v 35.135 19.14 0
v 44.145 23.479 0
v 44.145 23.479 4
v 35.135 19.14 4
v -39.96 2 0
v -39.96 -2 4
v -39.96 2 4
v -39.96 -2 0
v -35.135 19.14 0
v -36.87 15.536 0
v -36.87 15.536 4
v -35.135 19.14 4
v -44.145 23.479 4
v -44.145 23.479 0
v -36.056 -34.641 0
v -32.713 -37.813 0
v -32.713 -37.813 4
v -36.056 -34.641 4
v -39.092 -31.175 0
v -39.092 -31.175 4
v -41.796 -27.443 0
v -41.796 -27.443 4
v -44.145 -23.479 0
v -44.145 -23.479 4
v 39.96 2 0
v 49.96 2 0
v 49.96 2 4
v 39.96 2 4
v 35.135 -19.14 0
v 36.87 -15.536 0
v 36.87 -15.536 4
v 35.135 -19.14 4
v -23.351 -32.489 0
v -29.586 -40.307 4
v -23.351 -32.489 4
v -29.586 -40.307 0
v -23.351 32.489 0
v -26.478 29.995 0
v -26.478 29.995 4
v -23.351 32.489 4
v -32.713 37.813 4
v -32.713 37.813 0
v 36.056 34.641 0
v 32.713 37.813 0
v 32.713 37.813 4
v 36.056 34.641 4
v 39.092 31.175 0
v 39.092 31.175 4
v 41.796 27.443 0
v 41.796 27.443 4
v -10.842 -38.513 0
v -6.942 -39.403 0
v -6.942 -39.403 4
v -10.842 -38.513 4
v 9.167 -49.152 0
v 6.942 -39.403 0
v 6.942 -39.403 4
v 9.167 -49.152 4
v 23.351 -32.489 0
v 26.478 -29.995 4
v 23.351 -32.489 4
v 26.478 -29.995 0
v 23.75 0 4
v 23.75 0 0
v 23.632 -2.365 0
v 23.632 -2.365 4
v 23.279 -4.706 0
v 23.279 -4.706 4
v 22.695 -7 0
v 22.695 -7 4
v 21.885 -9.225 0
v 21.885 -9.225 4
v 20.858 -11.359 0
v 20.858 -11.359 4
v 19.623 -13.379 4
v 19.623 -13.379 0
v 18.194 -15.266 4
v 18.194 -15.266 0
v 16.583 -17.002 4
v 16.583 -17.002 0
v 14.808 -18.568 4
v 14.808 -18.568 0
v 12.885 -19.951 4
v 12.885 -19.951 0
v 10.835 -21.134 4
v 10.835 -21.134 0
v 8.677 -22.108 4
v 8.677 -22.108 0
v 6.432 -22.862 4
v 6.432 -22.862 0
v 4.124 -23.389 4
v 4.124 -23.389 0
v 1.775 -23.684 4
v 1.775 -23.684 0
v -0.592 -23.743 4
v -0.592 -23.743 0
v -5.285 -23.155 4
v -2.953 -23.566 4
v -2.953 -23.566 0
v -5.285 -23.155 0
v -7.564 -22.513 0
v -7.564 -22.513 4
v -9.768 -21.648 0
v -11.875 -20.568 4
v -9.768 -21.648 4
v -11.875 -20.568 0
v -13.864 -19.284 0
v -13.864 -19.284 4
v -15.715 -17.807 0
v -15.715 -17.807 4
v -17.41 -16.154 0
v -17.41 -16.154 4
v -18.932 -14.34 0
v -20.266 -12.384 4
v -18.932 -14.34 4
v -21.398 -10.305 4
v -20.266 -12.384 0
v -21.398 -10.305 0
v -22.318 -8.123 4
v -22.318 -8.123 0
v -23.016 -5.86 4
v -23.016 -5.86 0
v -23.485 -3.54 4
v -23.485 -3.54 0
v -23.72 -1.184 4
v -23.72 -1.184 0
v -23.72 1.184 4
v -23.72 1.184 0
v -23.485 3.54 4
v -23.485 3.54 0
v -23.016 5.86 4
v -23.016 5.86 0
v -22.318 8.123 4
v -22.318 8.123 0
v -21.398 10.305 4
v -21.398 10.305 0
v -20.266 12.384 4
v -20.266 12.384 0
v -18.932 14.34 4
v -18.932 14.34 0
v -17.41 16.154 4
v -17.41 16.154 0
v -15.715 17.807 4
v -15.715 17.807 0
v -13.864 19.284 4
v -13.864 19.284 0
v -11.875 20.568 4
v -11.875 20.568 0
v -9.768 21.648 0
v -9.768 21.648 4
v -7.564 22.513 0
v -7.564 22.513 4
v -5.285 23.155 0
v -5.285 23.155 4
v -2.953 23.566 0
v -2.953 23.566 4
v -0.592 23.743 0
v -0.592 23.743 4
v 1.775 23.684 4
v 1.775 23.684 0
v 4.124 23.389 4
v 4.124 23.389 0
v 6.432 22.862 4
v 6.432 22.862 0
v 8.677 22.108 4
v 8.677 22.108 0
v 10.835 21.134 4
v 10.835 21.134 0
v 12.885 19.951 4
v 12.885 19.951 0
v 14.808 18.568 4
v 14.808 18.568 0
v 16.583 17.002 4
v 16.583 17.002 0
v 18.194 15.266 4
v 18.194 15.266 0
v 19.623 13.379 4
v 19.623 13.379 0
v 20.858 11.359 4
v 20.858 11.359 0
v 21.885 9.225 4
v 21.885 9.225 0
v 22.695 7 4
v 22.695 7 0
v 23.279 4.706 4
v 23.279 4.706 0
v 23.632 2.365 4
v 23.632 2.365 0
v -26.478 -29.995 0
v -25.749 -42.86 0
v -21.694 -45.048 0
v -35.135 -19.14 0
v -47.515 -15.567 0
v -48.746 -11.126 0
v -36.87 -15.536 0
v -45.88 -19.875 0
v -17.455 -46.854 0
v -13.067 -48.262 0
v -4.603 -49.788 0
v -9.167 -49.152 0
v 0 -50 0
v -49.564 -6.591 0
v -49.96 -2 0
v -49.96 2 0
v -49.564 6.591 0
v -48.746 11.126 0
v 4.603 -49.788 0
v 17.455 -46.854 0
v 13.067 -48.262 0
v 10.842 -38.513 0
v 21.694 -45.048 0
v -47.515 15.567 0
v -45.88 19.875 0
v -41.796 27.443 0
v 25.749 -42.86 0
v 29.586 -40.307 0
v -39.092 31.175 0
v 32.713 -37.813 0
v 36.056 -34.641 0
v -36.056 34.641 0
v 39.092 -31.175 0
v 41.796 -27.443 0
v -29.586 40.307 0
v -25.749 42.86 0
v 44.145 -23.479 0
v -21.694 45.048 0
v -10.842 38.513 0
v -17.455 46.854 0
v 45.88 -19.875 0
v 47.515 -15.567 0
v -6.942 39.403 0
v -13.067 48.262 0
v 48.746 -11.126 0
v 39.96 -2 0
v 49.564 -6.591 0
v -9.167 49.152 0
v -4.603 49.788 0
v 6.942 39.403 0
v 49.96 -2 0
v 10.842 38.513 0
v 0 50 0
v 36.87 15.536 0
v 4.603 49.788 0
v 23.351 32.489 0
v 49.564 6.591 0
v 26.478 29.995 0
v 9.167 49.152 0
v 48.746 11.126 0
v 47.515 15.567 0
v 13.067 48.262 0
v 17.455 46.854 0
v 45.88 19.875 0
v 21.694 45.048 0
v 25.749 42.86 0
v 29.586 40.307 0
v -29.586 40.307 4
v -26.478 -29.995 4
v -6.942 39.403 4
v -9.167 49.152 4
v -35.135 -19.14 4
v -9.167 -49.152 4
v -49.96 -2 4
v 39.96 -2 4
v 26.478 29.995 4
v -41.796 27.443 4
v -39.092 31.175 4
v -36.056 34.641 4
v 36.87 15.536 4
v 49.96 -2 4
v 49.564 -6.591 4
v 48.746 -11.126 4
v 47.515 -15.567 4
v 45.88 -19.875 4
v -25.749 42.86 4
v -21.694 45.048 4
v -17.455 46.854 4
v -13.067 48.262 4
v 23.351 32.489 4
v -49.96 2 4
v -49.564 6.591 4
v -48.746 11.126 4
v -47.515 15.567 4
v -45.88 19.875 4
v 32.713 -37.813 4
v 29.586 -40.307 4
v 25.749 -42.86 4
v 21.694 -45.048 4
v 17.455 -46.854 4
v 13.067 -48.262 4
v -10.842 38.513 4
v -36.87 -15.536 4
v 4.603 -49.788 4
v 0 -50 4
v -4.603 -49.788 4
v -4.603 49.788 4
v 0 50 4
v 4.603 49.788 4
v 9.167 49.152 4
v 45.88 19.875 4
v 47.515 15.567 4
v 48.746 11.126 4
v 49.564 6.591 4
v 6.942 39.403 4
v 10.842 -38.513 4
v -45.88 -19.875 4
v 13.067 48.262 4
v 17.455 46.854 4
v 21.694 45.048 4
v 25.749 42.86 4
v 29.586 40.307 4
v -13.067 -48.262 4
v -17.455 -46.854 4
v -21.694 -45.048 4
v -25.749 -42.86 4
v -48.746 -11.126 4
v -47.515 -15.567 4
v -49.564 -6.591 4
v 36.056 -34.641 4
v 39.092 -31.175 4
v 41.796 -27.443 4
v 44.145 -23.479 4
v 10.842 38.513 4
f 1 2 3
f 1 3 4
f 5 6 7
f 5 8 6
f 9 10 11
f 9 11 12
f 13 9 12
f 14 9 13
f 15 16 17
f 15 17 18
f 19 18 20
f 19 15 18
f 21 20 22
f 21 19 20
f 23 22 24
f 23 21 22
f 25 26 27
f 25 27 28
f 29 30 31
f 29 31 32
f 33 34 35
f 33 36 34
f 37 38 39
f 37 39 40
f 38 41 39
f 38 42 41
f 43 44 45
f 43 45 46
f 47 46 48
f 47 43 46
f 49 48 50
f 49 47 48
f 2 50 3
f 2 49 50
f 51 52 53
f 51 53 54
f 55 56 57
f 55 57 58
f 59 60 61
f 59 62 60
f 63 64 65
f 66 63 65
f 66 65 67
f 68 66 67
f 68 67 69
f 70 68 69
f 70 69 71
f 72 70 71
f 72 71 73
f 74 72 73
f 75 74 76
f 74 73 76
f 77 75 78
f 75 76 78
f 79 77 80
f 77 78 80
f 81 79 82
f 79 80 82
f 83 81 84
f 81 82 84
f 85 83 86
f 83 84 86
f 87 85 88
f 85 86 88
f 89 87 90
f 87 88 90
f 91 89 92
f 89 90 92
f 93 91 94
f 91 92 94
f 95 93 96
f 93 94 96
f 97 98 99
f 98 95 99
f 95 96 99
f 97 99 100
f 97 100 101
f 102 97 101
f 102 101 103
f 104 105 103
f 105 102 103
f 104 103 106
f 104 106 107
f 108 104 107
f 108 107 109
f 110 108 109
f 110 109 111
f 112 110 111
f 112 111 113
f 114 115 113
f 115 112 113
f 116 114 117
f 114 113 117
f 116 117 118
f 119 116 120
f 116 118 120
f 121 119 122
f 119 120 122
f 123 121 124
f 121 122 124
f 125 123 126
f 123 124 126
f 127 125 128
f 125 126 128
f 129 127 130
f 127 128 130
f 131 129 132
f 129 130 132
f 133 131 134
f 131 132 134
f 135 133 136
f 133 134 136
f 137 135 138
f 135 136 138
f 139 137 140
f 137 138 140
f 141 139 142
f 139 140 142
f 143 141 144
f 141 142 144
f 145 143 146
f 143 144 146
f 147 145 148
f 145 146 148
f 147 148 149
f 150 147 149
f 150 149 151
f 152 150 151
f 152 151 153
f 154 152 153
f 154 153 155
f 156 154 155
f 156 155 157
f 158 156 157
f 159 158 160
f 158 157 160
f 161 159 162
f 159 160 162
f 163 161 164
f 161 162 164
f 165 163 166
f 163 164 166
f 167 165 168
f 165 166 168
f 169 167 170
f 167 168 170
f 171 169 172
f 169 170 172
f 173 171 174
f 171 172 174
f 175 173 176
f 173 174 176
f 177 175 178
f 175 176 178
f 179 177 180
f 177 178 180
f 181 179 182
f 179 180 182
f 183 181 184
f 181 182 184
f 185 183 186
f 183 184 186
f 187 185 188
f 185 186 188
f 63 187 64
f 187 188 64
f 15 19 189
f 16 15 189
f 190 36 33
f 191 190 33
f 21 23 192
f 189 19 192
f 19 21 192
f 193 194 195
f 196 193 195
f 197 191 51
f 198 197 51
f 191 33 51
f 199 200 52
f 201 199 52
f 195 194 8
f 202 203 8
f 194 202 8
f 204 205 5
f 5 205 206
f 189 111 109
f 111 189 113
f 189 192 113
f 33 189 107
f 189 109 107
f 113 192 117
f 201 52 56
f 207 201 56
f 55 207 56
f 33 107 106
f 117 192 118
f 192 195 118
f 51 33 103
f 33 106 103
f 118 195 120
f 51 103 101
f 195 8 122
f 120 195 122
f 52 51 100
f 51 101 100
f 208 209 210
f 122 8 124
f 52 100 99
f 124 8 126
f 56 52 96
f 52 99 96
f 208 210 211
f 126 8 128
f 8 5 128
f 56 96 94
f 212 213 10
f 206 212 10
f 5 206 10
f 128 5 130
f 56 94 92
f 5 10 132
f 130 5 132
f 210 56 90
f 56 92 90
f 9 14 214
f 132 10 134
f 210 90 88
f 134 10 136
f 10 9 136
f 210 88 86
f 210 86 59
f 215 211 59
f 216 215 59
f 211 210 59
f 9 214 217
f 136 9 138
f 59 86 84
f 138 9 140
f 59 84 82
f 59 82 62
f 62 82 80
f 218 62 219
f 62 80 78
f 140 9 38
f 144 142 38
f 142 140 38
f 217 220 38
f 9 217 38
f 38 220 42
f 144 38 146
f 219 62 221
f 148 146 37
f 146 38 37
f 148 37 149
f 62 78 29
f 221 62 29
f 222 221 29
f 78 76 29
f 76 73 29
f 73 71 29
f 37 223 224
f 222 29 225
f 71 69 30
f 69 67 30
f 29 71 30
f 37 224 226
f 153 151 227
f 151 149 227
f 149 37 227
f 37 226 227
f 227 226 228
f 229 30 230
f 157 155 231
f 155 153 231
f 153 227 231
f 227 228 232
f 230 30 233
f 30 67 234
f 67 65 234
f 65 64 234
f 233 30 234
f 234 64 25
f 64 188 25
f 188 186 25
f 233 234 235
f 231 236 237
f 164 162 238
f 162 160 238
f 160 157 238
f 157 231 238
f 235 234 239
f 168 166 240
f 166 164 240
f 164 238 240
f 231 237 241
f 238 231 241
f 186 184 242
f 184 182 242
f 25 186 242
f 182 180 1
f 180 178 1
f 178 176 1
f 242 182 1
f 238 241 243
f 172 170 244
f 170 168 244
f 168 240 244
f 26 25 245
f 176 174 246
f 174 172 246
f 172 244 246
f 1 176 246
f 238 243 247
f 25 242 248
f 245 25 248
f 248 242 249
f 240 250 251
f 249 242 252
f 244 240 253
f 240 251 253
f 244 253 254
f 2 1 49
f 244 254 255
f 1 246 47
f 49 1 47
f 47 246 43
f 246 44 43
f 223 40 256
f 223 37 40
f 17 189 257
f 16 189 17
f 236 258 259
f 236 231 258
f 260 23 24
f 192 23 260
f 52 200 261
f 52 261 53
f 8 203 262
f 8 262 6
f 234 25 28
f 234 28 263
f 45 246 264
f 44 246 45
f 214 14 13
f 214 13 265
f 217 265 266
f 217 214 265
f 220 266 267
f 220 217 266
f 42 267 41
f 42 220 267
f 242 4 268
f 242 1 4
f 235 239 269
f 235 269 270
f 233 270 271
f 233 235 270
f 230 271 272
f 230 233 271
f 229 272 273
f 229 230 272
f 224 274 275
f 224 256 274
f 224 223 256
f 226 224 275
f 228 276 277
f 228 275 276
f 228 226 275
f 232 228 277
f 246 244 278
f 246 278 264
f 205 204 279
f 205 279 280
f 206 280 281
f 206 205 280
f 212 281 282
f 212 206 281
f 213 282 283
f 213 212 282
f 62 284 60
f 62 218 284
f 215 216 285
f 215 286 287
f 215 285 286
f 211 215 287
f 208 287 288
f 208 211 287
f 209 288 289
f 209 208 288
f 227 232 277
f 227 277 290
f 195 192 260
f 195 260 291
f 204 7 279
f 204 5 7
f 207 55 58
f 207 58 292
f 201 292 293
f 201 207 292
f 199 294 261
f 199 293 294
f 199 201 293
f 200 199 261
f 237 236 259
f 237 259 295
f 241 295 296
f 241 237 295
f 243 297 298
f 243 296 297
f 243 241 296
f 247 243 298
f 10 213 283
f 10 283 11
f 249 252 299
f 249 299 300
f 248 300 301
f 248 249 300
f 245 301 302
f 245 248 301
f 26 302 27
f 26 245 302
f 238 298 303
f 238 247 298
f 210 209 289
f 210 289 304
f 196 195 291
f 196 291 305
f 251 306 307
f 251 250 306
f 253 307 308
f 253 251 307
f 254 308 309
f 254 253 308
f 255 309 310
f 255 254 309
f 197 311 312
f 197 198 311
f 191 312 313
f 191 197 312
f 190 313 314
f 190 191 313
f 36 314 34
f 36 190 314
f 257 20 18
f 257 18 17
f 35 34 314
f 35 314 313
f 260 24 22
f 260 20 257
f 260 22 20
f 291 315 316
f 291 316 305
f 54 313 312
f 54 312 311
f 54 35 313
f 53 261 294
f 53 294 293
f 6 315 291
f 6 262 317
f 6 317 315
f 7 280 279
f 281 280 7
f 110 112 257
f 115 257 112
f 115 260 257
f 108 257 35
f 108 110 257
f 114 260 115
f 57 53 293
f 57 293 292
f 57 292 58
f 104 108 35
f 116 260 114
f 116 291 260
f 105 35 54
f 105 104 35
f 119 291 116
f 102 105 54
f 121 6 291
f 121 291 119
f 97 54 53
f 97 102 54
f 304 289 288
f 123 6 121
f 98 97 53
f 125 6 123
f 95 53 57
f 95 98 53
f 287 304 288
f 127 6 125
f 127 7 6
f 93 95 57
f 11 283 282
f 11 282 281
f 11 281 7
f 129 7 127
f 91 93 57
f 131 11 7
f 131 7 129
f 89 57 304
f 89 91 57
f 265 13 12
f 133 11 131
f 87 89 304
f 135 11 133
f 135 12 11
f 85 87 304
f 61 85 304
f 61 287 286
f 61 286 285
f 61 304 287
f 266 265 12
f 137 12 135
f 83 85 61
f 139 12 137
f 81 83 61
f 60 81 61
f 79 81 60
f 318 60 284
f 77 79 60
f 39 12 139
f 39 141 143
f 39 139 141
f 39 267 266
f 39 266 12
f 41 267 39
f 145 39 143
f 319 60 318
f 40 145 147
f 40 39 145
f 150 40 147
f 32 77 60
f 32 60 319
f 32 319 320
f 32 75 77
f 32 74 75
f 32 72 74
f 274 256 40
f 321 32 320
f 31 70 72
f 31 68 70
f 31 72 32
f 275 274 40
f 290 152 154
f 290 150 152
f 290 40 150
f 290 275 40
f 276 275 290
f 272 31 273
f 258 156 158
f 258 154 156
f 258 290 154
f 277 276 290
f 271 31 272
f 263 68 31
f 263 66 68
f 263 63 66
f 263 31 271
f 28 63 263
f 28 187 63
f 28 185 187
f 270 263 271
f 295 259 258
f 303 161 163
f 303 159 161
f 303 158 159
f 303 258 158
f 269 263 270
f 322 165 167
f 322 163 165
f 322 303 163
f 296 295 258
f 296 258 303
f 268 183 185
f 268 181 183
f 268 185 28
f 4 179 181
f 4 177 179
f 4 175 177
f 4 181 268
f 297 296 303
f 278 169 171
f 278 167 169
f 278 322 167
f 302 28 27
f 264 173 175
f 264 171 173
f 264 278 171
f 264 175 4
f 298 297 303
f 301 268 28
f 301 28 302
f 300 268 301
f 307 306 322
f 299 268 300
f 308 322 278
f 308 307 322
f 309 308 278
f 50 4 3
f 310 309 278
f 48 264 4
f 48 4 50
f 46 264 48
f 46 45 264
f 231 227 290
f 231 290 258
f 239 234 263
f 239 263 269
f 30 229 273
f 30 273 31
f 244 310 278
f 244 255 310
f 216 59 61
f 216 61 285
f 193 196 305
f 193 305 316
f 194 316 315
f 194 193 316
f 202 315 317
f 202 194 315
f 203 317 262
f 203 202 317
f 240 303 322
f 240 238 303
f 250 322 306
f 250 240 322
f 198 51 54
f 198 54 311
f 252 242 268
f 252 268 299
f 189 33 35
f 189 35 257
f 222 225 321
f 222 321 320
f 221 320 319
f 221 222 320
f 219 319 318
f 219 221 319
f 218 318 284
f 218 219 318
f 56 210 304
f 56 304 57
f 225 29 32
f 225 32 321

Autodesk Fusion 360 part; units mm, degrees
sketch "Sketch1" plane through (0, 0, 0) normal (0, 0, 1) x (1, 0, 0)
  circle A0 centre (0, 0) radius 23.75
  line L0 (49.96, 2) -> (39.96, 2)
  line L1 (39.96, 2) -> (39.96, -2)
  line L2 (39.96, -2) -> (49.96, -2)
  line L3 (44.1446, 23.4788) -> (35.1349, 19.1399)
  line L4 (36.8705, 15.536) -> (45.8802, 19.8749)
  line L5 (35.1349, 19.1399) -> (36.8705, 15.536)
  line L6 (29.5859, 40.3073) -> (23.351, 32.489)
  line L7 (26.4783, 29.995) -> (32.7132, 37.8133)
  line L8 (23.351, 32.489) -> (26.4783, 29.995)
  line L9 (9.1673, 49.1524) -> (6.9421, 39.4031)
  line L10 (10.8418, 38.5131) -> (13.067, 48.2623)
  line L11 (6.9421, 39.4031) -> (10.8418, 38.5131)
  line L12 (-13.067, 48.2623) -> (-10.8418, 38.5131)
  line L13 (-6.9421, 39.4031) -> (-9.1673, 49.1524)
  line L14 (-10.8418, 38.5131) -> (-6.9421, 39.4031)
  line L15 (-32.7132, 37.8133) -> (-26.4783, 29.995)
  line L16 (-23.351, 32.489) -> (-29.5859, 40.3073)
  line L17 (-26.4783, 29.995) -> (-23.351, 32.489)
  line L18 (-45.8802, 19.8749) -> (-36.8705, 15.536)
  line L19 (-35.1349, 19.1399) -> (-44.1446, 23.4788)
  line L20 (-36.8705, 15.536) -> (-35.1349, 19.1399)
  line L21 (-49.96, -2) -> (-39.96, -2)
  line L22 (-39.96, 2) -> (-49.96, 2)
  line L23 (-39.96, -2) -> (-39.96, 2)
  line L24 (-44.1446, -23.4788) -> (-35.1349, -19.1399)
  line L25 (-36.8705, -15.536) -> (-45.8802, -19.8749)
  line L26 (-35.1349, -19.1399) -> (-36.8705, -15.536)
  line L27 (-29.5859, -40.3073) -> (-23.351, -32.489)
  line L28 (-26.4783, -29.995) -> (-32.7132, -37.8133)
  line L29 (-23.351, -32.489) -> (-26.4783, -29.995)
  line L30 (-9.1673, -49.1524) -> (-6.9421, -39.4031)
  line L31 (-10.8418, -38.5131) -> (-13.067, -48.2623)
  line L32 (-6.9421, -39.4031) -> (-10.8418, -38.5131)
  line L33 (13.067, -48.2623) -> (10.8418, -38.5131)
  line L34 (6.9421, -39.4031) -> (9.1673, -49.1524)
  line L35 (10.8418, -38.5131) -> (6.9421, -39.4031)
  line L36 (32.7132, -37.8133) -> (26.4783, -29.995)
  line L37 (23.351, -32.489) -> (29.5859, -40.3073)
  line L38 (26.4783, -29.995) -> (23.351, -32.489)
  line L39 (45.8802, -19.8749) -> (36.8705, -15.536)
  line L40 (35.1349, -19.1399) -> (44.1446, -23.4788)
  line L41 (36.8705, -15.536) -> (35.1349, -19.1399)
  arc A1 (49.96, 2) -> (45.8802, 19.8749) centre (0, 0) ccw
  arc A2 (44.1446, 23.4788) -> (32.7132, 37.8133) centre (0, 0) ccw
  arc A3 (29.5859, 40.3073) -> (13.067, 48.2623) centre (0, 0) ccw
  arc A4 (9.1673, 49.1524) -> (-9.1673, 49.1524) centre (0, 0) ccw
  arc A5 (-13.067, 48.2623) -> (-29.5859, 40.3073) centre (0, 0) ccw
  arc A6 (-32.7132, 37.8133) -> (-44.1446, 23.4788) centre (0, 0) ccw
  arc A7 (-45.8802, 19.8749) -> (-49.96, 2) centre (0, 0) ccw
  arc A8 (-49.96, -2) -> (-45.8802, -19.8749) centre (0, 0) ccw
  arc A9 (-44.1446, -23.4788) -> (-32.7132, -37.8133) centre (0, 0) ccw
  arc A10 (-29.5859, -40.3073) -> (-13.067, -48.2623) centre (0, 0) ccw
  arc A11 (-9.1673, -49.1524) -> (9.1673, -49.1524) centre (0, 0) ccw
  arc A12 (13.067, -48.2623) -> (29.5859, -40.3073) centre (0, 0) ccw
  arc A13 (32.7132, -37.8133) -> (44.1446, -23.4788) centre (0, 0) ccw
  arc A14 (45.8802, -19.8749) -> (49.96, -2) centre (0, 0) ccw
  dimension "d1" = 100
  dimension "d6" = 47.5
  dimension "d7" = 10
  dimension "d8" = 10
  dimension "d9" = 4
  dimension "d11" = 360
extrude "Extrude1" add sketch "Sketch1" along normal blind 4
equation "d1 = D_o"
equation "D_o = 100 mm"
equation "D_i = 47.5 mm"
equation "þykkt = 4 mm"
equation "offset = 10 mm"
equation "d6 = D_i"
equation "d7 = offset"
equation "d8 = offset"
equation "d9 = þykkt"
equation "d12 = þykkt"
